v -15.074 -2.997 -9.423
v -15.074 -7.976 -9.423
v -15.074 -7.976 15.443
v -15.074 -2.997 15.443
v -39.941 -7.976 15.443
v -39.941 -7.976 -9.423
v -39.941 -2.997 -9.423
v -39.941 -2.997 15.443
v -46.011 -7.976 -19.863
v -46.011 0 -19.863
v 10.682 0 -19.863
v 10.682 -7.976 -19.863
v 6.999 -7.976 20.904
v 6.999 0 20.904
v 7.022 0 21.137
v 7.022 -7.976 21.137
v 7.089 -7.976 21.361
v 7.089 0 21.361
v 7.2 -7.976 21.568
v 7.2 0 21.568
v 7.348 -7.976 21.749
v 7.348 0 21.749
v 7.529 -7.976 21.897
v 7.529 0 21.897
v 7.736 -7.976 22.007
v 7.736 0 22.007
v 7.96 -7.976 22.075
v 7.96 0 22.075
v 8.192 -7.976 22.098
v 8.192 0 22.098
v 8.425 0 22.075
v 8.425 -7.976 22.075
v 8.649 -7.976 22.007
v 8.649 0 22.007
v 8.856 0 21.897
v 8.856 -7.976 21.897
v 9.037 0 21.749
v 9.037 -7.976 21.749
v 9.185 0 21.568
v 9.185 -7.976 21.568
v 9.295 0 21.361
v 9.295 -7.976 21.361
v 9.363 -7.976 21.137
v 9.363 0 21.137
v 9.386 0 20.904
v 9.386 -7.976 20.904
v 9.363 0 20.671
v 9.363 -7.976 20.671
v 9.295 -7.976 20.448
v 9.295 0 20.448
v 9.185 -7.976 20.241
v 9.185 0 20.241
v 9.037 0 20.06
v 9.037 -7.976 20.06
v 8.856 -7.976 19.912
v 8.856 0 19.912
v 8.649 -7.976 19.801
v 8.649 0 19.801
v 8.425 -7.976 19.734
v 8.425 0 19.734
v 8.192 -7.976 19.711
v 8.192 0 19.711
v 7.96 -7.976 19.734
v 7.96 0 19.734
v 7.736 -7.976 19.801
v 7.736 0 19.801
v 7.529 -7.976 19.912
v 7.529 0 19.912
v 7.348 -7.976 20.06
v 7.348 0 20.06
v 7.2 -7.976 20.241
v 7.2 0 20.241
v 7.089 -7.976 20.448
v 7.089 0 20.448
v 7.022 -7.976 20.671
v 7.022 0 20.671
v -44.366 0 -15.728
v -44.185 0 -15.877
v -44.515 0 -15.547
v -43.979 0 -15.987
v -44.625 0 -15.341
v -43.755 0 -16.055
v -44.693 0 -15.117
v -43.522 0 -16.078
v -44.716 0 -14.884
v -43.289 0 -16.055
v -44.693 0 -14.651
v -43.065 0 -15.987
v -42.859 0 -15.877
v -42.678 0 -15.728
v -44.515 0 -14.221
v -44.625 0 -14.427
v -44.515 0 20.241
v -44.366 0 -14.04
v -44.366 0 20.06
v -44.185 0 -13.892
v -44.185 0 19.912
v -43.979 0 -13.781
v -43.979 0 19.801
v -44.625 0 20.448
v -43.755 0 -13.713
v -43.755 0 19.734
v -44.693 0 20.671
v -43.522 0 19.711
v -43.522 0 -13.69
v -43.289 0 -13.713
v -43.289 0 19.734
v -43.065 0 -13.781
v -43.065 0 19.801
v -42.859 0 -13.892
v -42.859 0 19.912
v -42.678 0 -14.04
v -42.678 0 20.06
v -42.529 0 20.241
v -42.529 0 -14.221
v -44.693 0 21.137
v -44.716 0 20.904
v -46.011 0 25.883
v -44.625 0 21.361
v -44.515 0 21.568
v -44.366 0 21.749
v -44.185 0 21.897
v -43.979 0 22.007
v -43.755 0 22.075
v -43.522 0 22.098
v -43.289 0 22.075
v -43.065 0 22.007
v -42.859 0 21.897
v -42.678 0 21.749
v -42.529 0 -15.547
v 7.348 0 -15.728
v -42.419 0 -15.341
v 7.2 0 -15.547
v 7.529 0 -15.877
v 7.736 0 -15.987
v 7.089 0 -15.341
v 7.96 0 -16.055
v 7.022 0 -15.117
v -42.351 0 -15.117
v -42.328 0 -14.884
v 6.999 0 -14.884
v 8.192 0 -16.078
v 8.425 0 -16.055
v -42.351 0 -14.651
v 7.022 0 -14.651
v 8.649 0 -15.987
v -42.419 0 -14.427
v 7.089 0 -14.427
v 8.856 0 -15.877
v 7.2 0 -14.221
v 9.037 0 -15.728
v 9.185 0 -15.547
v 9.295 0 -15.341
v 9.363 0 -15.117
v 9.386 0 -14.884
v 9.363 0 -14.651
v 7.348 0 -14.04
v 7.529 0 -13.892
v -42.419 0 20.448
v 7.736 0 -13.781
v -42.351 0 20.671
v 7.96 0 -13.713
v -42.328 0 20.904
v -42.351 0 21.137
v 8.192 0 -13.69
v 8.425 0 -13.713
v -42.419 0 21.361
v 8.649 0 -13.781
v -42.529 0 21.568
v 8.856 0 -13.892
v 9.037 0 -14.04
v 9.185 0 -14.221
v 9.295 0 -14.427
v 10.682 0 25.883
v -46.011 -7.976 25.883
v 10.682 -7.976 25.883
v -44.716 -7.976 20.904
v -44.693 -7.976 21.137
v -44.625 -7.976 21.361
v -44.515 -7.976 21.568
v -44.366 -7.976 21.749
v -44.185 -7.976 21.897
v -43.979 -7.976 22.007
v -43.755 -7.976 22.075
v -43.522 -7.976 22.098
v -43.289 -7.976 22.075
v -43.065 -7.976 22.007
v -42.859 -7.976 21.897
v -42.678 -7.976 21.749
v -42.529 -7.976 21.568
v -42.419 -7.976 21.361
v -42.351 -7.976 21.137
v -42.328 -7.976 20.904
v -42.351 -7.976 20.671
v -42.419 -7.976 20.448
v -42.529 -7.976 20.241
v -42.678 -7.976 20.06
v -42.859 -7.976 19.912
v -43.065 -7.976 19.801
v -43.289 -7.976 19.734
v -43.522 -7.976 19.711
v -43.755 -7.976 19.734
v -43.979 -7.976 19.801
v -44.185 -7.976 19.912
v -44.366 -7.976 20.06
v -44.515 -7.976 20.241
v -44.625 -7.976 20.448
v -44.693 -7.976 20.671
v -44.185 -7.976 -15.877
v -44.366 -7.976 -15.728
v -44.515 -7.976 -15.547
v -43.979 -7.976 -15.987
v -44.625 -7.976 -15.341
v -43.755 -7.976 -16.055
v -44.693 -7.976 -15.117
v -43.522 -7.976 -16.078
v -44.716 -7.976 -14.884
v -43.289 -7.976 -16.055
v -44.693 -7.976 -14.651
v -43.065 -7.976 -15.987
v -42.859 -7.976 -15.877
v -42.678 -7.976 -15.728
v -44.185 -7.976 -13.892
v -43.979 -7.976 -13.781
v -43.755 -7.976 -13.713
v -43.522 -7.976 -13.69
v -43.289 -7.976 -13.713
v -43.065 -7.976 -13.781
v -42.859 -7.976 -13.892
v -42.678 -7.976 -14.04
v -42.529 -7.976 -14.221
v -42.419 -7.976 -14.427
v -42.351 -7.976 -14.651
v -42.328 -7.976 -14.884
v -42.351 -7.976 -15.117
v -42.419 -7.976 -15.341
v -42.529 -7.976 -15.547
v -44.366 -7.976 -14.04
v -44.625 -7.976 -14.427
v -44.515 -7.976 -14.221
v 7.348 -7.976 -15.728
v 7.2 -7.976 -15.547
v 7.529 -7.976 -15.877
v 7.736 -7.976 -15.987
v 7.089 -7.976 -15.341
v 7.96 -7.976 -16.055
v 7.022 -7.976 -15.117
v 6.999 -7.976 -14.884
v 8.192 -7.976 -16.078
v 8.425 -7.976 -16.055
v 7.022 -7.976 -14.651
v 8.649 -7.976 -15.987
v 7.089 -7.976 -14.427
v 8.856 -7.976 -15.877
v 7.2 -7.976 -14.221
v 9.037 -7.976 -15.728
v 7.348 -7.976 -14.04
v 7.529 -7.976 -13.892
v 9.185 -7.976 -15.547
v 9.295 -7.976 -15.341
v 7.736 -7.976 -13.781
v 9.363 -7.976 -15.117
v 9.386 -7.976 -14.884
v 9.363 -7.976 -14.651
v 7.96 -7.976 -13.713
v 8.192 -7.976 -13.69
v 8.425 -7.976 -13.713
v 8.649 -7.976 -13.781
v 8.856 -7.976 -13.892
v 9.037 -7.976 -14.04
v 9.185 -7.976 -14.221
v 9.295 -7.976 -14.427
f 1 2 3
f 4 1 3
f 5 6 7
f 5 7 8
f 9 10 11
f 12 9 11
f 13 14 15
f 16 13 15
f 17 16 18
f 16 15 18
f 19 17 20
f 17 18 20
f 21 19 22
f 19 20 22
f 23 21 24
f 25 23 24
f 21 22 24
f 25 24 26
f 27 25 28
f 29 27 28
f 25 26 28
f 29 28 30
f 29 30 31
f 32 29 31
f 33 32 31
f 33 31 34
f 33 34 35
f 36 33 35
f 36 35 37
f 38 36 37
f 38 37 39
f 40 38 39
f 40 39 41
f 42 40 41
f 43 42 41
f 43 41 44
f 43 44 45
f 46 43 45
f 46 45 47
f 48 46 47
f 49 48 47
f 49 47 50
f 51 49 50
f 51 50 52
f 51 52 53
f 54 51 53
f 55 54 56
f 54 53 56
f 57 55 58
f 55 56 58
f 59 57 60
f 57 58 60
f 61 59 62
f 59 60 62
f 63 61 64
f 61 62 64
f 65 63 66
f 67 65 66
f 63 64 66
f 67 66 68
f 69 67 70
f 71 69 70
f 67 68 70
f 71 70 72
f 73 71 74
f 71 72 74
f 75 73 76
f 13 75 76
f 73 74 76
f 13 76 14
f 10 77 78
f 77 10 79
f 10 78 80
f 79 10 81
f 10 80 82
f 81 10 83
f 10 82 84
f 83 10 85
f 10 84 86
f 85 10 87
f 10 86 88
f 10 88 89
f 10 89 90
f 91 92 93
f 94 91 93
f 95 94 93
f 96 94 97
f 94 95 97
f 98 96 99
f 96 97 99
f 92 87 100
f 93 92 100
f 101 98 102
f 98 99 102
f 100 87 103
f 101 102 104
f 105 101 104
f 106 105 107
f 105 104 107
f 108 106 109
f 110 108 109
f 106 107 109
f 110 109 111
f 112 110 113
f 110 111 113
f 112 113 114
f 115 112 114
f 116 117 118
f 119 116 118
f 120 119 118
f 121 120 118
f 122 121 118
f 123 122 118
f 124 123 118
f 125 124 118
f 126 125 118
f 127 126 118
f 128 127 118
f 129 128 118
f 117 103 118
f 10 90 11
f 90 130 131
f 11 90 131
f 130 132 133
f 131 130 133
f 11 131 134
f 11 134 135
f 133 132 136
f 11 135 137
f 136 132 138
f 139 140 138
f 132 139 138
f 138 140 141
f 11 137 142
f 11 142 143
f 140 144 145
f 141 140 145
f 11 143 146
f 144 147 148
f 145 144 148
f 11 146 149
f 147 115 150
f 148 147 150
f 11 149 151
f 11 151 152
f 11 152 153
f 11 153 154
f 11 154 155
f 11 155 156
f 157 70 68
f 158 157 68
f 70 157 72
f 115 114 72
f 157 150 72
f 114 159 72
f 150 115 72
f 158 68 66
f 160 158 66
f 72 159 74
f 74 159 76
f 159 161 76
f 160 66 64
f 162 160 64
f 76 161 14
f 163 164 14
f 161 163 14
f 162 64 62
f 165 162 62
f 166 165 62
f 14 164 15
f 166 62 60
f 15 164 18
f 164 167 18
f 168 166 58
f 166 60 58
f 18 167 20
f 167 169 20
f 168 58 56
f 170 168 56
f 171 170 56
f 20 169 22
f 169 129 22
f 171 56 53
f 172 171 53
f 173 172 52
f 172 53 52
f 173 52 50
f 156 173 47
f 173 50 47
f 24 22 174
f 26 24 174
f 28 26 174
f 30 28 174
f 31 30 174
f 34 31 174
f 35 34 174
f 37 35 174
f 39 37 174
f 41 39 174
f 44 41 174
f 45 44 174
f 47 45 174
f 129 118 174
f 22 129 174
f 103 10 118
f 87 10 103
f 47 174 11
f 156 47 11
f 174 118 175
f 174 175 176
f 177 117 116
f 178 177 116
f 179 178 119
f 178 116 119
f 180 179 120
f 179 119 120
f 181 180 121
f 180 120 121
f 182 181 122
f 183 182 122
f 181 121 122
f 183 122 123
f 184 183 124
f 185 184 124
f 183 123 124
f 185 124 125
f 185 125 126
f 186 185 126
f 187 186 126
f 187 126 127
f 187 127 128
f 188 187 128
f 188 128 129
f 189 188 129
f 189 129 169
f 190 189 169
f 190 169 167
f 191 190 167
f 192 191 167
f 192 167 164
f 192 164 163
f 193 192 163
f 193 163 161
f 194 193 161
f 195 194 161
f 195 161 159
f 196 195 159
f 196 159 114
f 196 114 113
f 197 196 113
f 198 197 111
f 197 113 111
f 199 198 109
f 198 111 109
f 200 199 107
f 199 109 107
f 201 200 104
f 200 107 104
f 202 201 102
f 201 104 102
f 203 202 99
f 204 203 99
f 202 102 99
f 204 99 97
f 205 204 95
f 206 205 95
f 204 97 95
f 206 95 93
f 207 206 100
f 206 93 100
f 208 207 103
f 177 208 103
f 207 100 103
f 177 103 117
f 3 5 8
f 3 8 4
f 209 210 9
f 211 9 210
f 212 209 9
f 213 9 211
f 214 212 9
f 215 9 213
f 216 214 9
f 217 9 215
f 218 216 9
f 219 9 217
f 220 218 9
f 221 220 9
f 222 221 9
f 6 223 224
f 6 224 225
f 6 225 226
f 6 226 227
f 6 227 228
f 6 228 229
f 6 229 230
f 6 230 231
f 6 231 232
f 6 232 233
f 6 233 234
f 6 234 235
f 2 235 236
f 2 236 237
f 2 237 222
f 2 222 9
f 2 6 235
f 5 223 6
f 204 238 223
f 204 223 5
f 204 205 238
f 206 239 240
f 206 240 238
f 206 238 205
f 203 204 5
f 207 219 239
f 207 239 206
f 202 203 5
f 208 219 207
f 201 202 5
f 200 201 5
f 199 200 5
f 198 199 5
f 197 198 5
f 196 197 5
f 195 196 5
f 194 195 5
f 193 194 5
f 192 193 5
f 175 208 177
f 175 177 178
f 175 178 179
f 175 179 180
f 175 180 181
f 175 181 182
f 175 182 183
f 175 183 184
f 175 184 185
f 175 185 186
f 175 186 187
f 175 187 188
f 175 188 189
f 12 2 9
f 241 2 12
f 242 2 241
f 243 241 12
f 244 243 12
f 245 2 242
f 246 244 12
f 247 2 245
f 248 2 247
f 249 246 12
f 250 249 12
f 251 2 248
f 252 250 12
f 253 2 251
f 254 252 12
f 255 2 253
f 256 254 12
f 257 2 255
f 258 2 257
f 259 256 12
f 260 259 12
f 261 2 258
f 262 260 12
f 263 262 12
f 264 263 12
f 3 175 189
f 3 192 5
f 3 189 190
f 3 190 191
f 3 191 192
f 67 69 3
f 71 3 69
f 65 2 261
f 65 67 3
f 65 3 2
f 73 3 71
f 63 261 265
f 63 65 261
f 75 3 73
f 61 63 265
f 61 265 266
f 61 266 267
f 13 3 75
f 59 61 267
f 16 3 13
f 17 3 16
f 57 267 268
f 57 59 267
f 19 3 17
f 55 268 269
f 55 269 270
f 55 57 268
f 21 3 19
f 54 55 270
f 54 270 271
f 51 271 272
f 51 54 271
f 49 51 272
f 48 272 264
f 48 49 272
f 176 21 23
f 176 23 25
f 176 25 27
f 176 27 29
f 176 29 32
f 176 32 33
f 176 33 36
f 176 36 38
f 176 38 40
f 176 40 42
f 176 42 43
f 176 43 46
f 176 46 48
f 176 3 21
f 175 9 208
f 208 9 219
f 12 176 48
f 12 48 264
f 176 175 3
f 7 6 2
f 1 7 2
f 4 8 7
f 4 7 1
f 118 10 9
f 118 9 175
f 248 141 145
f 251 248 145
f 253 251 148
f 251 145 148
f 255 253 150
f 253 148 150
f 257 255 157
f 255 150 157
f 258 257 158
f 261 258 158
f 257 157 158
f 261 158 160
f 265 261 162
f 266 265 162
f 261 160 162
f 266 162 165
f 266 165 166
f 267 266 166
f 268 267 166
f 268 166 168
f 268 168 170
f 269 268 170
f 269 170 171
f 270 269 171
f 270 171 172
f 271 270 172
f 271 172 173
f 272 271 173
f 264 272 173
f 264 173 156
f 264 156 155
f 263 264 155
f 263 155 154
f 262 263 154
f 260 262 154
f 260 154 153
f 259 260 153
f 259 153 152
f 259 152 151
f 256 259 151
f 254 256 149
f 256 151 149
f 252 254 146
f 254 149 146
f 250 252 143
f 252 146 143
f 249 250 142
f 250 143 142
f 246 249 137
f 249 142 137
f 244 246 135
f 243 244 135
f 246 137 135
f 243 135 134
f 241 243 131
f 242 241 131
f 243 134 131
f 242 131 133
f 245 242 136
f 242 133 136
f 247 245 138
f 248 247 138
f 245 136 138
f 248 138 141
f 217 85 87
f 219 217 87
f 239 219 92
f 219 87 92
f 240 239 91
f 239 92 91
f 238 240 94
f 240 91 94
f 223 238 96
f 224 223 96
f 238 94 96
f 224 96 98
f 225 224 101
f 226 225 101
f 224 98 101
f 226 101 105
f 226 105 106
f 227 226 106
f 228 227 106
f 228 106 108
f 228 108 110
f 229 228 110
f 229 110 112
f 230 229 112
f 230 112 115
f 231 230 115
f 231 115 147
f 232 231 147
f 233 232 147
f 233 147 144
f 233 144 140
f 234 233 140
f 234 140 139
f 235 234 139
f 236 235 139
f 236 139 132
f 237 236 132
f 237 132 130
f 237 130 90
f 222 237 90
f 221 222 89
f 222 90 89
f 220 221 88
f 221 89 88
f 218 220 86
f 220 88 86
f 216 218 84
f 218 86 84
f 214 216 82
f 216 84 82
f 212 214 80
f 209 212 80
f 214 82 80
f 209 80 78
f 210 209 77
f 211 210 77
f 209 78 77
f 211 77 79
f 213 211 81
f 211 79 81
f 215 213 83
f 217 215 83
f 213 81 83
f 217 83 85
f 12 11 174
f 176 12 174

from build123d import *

# Parameters (mm, degrees)
F0_W     = 56.6928
F0_H     = 45.7454
F1_DEPTH = 7.9756
F3_D     = 2.3876
F4_W     = 24.8666
F4_H     = 24.8666
F5_DEPTH = 4.9784


with BuildPart() as f1:
    # F0 (on Front) → F1 (new body)
    with BuildSketch(Plane.XZ):
        with Locations((-17.6647957414, 3.0100650459)):
            Rectangle(F0_W, F0_H)
    extrude(amount=F1_DEPTH)

    # F3 (through all)
    with Locations(Plane.XZ.offset(7.9756)):
        with Locations((-43.5219957414, 20.9043650459), (8.1924042586, 20.9043650459), (8.1924042586, -14.8842349541), (-43.5219957414, -14.8842349541)):
            Hole(F3_D / 2)

    # F4 (on face) → F5 (cut)
    with BuildSketch(Plane.XZ.offset(7.9756)):
        with Locations((-27.5072957414, 3.0100650459)):
            Rectangle(F4_W, F4_H)
    extrude(amount=-F5_DEPTH, mode=Mode.SUBTRACT)


solid = f1.part
